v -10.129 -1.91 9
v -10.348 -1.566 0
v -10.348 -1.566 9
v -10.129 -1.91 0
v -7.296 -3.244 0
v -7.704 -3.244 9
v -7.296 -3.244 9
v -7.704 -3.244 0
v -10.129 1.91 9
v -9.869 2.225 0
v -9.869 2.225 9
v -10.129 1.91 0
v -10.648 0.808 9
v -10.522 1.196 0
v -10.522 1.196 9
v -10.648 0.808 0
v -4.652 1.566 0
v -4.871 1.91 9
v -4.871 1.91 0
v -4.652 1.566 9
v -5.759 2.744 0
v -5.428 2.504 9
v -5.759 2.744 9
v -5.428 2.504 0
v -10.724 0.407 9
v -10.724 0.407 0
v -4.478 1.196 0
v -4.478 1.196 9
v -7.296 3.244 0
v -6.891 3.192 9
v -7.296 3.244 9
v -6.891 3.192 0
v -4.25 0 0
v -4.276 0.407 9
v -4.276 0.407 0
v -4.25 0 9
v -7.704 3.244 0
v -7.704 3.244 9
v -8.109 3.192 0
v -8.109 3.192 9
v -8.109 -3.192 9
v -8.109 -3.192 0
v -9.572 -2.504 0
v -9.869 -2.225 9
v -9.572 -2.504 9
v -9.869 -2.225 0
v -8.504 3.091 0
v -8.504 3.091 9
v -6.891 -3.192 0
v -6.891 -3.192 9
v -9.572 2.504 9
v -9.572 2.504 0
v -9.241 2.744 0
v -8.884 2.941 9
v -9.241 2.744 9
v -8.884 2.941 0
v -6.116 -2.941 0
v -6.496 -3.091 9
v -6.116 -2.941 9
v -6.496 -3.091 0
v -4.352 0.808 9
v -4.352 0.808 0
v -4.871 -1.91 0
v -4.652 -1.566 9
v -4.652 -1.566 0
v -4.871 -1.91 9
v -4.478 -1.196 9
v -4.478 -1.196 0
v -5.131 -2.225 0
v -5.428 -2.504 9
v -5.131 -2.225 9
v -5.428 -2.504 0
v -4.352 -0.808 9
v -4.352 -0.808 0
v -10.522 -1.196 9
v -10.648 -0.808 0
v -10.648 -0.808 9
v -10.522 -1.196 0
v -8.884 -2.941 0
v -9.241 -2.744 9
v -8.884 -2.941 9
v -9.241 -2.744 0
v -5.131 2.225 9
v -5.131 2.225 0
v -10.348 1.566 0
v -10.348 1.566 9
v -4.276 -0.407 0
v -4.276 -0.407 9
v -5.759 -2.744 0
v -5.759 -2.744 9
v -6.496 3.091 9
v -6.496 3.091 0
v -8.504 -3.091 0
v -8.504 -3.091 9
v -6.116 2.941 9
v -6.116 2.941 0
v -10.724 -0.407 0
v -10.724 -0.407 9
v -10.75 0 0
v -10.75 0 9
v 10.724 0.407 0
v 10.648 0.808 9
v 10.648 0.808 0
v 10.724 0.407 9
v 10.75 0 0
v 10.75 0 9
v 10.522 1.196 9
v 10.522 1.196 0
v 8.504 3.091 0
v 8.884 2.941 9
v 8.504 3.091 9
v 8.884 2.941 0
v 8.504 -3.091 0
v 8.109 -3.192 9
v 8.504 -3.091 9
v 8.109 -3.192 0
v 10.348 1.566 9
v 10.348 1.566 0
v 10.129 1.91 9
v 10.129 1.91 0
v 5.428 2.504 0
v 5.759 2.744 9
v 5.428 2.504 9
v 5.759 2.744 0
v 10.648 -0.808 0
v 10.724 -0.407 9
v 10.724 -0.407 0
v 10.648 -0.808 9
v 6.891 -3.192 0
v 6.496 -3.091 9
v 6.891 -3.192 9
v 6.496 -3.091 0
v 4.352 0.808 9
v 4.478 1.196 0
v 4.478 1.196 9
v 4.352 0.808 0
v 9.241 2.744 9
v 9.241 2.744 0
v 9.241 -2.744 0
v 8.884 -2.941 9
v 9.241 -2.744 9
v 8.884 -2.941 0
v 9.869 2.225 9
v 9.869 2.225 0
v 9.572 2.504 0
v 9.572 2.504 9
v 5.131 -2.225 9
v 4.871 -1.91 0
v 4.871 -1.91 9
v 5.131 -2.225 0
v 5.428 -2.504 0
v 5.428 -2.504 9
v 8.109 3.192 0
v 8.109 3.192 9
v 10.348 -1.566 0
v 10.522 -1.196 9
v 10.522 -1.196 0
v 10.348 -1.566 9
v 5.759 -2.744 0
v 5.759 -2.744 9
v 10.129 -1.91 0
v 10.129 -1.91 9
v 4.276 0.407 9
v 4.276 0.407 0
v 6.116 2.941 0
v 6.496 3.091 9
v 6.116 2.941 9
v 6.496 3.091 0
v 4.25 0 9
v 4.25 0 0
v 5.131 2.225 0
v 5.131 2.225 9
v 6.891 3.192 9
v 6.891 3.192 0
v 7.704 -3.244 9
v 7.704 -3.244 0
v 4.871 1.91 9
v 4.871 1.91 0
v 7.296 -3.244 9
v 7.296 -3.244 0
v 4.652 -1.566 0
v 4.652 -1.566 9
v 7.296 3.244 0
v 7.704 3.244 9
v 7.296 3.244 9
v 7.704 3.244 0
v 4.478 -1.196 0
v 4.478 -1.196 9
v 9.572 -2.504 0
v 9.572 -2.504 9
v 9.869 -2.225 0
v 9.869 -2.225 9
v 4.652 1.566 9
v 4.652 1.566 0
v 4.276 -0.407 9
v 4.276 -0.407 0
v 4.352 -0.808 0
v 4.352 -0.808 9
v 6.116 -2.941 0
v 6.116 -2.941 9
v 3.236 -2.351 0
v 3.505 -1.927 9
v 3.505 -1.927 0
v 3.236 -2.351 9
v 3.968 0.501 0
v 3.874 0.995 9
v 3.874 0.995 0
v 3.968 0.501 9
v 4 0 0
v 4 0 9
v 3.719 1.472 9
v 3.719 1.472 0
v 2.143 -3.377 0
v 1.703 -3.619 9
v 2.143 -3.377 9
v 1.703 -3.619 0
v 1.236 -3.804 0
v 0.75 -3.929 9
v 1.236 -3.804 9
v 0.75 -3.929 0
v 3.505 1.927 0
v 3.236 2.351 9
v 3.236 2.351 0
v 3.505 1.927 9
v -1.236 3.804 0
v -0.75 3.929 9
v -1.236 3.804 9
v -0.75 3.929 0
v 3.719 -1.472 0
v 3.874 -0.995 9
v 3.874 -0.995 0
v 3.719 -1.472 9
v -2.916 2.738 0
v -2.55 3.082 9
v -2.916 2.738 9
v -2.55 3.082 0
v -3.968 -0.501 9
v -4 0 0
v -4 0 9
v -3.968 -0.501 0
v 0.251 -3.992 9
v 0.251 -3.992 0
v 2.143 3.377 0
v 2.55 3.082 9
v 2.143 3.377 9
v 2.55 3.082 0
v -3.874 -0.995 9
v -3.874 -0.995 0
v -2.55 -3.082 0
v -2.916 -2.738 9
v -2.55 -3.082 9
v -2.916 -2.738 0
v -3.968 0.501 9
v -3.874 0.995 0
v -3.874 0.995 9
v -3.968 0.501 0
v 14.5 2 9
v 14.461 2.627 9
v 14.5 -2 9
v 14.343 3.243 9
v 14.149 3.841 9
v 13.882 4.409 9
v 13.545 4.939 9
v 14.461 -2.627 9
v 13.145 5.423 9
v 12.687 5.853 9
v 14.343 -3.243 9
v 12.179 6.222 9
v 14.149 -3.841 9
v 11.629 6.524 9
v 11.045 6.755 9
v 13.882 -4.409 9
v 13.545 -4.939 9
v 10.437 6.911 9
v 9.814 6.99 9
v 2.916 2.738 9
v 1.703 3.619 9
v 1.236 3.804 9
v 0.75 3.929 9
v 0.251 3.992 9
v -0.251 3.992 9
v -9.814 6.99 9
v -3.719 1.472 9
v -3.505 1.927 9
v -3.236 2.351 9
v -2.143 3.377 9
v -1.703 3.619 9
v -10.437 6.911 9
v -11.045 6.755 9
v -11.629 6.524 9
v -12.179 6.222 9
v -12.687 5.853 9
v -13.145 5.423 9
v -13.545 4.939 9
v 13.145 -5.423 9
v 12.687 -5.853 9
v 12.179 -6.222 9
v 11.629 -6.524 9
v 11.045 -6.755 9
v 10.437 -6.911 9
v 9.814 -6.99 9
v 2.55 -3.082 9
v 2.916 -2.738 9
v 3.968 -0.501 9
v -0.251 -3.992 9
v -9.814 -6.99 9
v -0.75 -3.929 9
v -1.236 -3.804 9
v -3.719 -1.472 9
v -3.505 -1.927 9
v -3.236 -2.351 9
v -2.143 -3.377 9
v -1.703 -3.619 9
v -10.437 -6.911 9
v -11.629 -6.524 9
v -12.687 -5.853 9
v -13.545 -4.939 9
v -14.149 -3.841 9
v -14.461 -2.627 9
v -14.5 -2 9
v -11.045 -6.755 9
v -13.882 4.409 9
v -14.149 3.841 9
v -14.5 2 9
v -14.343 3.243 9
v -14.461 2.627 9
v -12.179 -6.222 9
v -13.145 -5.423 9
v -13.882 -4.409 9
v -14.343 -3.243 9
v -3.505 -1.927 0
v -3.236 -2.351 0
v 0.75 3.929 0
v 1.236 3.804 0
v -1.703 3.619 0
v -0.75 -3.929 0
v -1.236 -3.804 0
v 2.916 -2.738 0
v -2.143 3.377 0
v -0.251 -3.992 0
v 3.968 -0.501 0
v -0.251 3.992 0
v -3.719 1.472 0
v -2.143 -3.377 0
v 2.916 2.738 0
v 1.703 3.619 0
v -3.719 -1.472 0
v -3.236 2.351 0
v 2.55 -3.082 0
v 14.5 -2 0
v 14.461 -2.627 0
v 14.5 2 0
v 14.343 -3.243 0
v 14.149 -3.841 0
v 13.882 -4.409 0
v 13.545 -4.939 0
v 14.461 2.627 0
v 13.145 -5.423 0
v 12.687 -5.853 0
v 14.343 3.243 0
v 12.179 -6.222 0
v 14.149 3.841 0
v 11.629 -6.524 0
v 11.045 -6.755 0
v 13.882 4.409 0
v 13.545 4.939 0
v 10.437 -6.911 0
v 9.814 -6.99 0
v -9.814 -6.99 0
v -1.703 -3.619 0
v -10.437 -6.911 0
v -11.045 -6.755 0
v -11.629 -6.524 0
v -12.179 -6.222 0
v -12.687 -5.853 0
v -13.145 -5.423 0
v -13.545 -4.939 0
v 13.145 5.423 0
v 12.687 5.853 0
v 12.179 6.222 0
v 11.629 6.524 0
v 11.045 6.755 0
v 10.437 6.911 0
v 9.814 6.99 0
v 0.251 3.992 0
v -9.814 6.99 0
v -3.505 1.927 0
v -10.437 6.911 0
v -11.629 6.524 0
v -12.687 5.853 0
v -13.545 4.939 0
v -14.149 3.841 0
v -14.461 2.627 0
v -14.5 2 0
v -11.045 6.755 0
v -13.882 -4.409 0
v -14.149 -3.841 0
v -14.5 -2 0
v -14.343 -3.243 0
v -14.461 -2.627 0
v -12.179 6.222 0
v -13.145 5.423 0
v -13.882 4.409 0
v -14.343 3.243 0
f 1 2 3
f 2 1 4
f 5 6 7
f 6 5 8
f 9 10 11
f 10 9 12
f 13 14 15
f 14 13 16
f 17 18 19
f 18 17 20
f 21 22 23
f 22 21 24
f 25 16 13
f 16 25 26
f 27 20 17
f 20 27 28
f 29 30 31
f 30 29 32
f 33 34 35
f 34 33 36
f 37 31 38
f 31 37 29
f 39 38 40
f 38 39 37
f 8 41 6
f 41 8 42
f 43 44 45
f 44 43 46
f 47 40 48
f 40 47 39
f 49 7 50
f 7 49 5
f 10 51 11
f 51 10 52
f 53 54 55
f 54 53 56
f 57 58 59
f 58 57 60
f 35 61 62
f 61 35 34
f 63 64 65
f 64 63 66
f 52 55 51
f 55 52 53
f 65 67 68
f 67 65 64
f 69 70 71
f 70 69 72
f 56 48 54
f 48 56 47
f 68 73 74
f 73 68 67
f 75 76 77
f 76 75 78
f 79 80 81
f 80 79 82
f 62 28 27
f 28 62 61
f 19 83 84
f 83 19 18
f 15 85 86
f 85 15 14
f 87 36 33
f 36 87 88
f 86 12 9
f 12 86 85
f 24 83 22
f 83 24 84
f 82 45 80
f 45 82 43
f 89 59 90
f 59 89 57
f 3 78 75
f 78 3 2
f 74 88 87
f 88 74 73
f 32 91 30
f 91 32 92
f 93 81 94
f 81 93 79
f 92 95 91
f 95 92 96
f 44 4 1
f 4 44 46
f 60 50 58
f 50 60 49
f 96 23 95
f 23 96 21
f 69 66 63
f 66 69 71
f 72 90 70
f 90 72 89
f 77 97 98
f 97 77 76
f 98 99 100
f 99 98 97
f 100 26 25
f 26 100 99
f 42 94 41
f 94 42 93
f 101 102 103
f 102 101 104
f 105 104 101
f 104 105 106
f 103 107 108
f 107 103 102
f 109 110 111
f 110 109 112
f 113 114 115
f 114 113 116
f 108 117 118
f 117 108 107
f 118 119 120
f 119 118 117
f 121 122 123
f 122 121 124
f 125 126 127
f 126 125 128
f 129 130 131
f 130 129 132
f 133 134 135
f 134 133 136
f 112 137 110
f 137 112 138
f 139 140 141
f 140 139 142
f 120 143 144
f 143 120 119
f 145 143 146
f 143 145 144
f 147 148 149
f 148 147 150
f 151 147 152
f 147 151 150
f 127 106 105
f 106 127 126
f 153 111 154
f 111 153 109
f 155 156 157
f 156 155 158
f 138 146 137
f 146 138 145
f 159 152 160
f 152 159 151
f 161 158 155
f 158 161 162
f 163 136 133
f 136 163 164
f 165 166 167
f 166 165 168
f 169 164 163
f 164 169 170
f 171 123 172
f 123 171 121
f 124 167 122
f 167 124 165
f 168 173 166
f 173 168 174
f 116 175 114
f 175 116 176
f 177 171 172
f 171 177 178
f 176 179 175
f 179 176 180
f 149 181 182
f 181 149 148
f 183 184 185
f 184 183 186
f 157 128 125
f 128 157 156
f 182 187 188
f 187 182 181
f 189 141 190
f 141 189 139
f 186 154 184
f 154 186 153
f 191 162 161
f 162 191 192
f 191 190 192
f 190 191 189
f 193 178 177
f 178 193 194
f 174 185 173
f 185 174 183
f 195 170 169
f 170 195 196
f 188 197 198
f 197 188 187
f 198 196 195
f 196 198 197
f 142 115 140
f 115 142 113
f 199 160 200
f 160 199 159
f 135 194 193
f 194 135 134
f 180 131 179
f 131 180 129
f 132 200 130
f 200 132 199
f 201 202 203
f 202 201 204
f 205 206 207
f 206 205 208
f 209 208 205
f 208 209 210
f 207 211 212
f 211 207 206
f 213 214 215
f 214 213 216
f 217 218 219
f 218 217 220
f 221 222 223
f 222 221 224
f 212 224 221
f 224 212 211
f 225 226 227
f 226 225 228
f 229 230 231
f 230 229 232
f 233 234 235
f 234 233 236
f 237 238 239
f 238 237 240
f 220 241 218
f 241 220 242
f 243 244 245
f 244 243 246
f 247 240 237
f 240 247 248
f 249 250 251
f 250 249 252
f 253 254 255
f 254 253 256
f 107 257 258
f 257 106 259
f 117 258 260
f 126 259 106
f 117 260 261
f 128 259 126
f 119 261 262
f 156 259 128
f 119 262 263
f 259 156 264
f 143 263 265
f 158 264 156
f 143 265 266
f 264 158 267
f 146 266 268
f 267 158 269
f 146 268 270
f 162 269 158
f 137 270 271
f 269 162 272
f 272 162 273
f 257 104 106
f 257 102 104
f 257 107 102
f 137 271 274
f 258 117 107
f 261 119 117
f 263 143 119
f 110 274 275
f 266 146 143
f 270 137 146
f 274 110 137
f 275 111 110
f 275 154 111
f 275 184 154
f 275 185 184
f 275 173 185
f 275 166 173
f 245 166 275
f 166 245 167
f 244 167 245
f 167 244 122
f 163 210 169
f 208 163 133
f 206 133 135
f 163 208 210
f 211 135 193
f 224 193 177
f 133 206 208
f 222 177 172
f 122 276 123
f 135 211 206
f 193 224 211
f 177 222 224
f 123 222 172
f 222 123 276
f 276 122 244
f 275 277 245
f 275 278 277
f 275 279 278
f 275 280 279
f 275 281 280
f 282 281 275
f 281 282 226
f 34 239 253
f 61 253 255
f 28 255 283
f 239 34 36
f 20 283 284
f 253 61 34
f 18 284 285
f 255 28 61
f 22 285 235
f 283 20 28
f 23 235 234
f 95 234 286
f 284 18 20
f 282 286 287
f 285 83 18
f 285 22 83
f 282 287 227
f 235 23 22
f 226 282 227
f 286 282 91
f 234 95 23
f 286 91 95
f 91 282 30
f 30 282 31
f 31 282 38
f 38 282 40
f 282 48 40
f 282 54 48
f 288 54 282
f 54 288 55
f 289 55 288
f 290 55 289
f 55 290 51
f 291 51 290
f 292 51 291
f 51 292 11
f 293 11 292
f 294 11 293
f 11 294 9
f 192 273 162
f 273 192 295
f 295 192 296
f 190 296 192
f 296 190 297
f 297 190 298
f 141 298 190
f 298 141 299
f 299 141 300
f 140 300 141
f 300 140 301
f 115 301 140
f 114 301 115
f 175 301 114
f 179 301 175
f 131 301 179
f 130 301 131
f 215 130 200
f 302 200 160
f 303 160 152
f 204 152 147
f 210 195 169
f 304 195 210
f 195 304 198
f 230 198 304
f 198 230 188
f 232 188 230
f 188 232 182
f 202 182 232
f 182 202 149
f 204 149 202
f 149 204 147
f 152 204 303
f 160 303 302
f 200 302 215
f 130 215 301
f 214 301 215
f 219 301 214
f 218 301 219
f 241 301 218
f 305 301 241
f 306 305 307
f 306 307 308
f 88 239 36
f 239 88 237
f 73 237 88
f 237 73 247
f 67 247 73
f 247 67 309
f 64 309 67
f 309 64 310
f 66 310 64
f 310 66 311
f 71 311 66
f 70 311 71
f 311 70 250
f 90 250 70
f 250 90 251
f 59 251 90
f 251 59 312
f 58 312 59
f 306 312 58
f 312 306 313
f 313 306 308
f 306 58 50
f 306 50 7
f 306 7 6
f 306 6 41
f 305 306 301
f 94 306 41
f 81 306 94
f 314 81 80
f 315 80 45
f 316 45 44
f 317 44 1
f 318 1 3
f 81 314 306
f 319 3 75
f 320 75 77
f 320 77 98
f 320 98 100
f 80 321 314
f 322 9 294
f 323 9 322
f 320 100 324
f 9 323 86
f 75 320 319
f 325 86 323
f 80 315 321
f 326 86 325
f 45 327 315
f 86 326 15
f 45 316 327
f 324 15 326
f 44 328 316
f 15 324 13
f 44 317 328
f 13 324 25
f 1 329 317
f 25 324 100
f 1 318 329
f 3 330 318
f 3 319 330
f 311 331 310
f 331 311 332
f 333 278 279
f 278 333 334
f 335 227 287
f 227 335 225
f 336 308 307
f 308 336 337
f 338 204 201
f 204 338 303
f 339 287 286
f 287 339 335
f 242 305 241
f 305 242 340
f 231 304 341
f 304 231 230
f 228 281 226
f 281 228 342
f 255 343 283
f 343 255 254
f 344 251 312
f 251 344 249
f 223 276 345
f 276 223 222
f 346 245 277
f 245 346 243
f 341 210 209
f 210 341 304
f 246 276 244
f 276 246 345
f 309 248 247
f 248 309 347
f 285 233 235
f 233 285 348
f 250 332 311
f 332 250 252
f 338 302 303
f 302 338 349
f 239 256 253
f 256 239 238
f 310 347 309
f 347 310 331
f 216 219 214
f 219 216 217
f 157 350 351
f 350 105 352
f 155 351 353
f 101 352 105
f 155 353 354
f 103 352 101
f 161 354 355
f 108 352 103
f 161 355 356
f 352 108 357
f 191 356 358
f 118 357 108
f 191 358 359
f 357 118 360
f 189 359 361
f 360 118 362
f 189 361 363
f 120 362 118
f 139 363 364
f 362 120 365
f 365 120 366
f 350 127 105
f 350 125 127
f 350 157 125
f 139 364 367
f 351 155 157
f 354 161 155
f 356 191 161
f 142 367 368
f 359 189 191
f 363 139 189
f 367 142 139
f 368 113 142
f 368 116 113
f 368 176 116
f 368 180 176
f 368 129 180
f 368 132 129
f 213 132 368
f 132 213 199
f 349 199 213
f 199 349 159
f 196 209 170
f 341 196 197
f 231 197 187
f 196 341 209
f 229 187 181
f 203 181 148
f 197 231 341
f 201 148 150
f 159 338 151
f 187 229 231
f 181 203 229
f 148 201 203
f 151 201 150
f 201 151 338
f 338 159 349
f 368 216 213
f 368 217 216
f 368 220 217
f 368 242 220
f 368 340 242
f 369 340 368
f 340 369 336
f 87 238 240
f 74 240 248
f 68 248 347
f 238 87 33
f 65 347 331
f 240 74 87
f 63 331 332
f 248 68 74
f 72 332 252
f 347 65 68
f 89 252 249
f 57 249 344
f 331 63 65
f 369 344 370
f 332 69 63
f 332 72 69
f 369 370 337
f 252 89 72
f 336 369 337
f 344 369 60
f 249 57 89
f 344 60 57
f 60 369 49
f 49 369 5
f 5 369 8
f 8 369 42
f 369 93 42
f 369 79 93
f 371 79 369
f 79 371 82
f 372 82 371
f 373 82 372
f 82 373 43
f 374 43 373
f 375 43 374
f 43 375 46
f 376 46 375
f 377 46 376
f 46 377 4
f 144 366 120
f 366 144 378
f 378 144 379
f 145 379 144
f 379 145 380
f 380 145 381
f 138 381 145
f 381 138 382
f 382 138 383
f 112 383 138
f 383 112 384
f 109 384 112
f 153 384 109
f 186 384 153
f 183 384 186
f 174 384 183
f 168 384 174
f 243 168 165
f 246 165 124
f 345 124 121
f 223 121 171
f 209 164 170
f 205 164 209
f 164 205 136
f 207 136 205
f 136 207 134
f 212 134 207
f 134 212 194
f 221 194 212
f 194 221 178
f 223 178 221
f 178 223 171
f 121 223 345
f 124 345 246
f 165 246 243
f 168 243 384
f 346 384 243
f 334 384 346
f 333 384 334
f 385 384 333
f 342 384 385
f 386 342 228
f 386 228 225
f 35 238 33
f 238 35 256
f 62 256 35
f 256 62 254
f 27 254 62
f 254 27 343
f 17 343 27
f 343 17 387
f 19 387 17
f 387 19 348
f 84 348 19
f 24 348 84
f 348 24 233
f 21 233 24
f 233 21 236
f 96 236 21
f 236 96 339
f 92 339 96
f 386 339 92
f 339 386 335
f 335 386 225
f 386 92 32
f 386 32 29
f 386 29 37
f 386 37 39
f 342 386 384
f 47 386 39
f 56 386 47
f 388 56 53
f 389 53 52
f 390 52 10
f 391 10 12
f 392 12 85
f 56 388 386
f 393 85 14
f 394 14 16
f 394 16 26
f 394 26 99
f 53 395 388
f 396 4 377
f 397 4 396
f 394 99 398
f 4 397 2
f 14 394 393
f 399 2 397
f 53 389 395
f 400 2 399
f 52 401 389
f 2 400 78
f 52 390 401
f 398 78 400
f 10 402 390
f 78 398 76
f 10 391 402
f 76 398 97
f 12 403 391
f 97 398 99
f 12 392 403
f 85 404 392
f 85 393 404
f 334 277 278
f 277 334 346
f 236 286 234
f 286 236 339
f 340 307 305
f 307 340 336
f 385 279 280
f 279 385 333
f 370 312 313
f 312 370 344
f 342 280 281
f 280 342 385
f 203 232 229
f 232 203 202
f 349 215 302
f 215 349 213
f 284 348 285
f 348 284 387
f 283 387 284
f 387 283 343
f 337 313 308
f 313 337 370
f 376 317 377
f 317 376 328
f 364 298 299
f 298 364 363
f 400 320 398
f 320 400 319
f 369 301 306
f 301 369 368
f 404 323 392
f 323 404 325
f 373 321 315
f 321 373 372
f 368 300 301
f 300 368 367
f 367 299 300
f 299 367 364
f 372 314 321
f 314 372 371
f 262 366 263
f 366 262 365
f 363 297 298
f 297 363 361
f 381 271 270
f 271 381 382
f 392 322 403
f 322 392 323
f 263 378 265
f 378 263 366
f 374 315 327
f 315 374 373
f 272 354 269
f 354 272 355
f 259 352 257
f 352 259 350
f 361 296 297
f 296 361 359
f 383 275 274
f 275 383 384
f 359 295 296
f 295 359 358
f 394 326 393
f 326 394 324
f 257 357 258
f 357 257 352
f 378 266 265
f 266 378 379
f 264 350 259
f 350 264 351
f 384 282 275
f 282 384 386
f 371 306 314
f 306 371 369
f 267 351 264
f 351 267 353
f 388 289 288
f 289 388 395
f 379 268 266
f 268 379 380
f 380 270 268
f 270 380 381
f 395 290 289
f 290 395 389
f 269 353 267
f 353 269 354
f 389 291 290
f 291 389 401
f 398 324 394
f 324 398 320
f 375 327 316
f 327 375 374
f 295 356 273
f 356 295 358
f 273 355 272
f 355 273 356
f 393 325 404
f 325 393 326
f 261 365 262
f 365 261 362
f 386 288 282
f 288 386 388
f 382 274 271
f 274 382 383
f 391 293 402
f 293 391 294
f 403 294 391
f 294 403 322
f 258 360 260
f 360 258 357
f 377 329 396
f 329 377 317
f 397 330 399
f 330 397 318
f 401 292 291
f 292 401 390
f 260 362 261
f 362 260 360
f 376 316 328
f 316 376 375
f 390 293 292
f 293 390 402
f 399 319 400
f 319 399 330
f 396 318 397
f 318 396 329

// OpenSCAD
$fn = 50;


difference() {
	union() {
		hull() {
			translate(v = [-9.5000000000, 2.0000000000, 0]) {
				cylinder(h = 9, r = 5);
			}
			translate(v = [9.5000000000, 2.0000000000, 0]) {
				cylinder(h = 9, r = 5);
			}
			translate(v = [-9.5000000000, -2.0000000000, 0]) {
				cylinder(h = 9, r = 5);
			}
			translate(v = [9.5000000000, -2.0000000000, 0]) {
				cylinder(h = 9, r = 5);
			}
		}
	}
	union() {
		#translate(v = [-7.5000000000, 0.0000000000, -100.0000000000]) {
			cylinder(h = 200, r = 3.2500000000);
		}
		#translate(v = [-7.5000000000, 0.0000000000, -100.0000000000]) {
			cylinder(h = 200, r = 3.2500000000);
		}
		#translate(v = [7.5000000000, 0.0000000000, -100.0000000000]) {
			cylinder(h = 200, r = 3.2500000000);
		}
		#translate(v = [7.5000000000, 0.0000000000, -100.0000000000]) {
			cylinder(h = 200, r = 3.2500000000);
		}
		#cylinder(h = 9, r = 4.0000000000);
	}
}
